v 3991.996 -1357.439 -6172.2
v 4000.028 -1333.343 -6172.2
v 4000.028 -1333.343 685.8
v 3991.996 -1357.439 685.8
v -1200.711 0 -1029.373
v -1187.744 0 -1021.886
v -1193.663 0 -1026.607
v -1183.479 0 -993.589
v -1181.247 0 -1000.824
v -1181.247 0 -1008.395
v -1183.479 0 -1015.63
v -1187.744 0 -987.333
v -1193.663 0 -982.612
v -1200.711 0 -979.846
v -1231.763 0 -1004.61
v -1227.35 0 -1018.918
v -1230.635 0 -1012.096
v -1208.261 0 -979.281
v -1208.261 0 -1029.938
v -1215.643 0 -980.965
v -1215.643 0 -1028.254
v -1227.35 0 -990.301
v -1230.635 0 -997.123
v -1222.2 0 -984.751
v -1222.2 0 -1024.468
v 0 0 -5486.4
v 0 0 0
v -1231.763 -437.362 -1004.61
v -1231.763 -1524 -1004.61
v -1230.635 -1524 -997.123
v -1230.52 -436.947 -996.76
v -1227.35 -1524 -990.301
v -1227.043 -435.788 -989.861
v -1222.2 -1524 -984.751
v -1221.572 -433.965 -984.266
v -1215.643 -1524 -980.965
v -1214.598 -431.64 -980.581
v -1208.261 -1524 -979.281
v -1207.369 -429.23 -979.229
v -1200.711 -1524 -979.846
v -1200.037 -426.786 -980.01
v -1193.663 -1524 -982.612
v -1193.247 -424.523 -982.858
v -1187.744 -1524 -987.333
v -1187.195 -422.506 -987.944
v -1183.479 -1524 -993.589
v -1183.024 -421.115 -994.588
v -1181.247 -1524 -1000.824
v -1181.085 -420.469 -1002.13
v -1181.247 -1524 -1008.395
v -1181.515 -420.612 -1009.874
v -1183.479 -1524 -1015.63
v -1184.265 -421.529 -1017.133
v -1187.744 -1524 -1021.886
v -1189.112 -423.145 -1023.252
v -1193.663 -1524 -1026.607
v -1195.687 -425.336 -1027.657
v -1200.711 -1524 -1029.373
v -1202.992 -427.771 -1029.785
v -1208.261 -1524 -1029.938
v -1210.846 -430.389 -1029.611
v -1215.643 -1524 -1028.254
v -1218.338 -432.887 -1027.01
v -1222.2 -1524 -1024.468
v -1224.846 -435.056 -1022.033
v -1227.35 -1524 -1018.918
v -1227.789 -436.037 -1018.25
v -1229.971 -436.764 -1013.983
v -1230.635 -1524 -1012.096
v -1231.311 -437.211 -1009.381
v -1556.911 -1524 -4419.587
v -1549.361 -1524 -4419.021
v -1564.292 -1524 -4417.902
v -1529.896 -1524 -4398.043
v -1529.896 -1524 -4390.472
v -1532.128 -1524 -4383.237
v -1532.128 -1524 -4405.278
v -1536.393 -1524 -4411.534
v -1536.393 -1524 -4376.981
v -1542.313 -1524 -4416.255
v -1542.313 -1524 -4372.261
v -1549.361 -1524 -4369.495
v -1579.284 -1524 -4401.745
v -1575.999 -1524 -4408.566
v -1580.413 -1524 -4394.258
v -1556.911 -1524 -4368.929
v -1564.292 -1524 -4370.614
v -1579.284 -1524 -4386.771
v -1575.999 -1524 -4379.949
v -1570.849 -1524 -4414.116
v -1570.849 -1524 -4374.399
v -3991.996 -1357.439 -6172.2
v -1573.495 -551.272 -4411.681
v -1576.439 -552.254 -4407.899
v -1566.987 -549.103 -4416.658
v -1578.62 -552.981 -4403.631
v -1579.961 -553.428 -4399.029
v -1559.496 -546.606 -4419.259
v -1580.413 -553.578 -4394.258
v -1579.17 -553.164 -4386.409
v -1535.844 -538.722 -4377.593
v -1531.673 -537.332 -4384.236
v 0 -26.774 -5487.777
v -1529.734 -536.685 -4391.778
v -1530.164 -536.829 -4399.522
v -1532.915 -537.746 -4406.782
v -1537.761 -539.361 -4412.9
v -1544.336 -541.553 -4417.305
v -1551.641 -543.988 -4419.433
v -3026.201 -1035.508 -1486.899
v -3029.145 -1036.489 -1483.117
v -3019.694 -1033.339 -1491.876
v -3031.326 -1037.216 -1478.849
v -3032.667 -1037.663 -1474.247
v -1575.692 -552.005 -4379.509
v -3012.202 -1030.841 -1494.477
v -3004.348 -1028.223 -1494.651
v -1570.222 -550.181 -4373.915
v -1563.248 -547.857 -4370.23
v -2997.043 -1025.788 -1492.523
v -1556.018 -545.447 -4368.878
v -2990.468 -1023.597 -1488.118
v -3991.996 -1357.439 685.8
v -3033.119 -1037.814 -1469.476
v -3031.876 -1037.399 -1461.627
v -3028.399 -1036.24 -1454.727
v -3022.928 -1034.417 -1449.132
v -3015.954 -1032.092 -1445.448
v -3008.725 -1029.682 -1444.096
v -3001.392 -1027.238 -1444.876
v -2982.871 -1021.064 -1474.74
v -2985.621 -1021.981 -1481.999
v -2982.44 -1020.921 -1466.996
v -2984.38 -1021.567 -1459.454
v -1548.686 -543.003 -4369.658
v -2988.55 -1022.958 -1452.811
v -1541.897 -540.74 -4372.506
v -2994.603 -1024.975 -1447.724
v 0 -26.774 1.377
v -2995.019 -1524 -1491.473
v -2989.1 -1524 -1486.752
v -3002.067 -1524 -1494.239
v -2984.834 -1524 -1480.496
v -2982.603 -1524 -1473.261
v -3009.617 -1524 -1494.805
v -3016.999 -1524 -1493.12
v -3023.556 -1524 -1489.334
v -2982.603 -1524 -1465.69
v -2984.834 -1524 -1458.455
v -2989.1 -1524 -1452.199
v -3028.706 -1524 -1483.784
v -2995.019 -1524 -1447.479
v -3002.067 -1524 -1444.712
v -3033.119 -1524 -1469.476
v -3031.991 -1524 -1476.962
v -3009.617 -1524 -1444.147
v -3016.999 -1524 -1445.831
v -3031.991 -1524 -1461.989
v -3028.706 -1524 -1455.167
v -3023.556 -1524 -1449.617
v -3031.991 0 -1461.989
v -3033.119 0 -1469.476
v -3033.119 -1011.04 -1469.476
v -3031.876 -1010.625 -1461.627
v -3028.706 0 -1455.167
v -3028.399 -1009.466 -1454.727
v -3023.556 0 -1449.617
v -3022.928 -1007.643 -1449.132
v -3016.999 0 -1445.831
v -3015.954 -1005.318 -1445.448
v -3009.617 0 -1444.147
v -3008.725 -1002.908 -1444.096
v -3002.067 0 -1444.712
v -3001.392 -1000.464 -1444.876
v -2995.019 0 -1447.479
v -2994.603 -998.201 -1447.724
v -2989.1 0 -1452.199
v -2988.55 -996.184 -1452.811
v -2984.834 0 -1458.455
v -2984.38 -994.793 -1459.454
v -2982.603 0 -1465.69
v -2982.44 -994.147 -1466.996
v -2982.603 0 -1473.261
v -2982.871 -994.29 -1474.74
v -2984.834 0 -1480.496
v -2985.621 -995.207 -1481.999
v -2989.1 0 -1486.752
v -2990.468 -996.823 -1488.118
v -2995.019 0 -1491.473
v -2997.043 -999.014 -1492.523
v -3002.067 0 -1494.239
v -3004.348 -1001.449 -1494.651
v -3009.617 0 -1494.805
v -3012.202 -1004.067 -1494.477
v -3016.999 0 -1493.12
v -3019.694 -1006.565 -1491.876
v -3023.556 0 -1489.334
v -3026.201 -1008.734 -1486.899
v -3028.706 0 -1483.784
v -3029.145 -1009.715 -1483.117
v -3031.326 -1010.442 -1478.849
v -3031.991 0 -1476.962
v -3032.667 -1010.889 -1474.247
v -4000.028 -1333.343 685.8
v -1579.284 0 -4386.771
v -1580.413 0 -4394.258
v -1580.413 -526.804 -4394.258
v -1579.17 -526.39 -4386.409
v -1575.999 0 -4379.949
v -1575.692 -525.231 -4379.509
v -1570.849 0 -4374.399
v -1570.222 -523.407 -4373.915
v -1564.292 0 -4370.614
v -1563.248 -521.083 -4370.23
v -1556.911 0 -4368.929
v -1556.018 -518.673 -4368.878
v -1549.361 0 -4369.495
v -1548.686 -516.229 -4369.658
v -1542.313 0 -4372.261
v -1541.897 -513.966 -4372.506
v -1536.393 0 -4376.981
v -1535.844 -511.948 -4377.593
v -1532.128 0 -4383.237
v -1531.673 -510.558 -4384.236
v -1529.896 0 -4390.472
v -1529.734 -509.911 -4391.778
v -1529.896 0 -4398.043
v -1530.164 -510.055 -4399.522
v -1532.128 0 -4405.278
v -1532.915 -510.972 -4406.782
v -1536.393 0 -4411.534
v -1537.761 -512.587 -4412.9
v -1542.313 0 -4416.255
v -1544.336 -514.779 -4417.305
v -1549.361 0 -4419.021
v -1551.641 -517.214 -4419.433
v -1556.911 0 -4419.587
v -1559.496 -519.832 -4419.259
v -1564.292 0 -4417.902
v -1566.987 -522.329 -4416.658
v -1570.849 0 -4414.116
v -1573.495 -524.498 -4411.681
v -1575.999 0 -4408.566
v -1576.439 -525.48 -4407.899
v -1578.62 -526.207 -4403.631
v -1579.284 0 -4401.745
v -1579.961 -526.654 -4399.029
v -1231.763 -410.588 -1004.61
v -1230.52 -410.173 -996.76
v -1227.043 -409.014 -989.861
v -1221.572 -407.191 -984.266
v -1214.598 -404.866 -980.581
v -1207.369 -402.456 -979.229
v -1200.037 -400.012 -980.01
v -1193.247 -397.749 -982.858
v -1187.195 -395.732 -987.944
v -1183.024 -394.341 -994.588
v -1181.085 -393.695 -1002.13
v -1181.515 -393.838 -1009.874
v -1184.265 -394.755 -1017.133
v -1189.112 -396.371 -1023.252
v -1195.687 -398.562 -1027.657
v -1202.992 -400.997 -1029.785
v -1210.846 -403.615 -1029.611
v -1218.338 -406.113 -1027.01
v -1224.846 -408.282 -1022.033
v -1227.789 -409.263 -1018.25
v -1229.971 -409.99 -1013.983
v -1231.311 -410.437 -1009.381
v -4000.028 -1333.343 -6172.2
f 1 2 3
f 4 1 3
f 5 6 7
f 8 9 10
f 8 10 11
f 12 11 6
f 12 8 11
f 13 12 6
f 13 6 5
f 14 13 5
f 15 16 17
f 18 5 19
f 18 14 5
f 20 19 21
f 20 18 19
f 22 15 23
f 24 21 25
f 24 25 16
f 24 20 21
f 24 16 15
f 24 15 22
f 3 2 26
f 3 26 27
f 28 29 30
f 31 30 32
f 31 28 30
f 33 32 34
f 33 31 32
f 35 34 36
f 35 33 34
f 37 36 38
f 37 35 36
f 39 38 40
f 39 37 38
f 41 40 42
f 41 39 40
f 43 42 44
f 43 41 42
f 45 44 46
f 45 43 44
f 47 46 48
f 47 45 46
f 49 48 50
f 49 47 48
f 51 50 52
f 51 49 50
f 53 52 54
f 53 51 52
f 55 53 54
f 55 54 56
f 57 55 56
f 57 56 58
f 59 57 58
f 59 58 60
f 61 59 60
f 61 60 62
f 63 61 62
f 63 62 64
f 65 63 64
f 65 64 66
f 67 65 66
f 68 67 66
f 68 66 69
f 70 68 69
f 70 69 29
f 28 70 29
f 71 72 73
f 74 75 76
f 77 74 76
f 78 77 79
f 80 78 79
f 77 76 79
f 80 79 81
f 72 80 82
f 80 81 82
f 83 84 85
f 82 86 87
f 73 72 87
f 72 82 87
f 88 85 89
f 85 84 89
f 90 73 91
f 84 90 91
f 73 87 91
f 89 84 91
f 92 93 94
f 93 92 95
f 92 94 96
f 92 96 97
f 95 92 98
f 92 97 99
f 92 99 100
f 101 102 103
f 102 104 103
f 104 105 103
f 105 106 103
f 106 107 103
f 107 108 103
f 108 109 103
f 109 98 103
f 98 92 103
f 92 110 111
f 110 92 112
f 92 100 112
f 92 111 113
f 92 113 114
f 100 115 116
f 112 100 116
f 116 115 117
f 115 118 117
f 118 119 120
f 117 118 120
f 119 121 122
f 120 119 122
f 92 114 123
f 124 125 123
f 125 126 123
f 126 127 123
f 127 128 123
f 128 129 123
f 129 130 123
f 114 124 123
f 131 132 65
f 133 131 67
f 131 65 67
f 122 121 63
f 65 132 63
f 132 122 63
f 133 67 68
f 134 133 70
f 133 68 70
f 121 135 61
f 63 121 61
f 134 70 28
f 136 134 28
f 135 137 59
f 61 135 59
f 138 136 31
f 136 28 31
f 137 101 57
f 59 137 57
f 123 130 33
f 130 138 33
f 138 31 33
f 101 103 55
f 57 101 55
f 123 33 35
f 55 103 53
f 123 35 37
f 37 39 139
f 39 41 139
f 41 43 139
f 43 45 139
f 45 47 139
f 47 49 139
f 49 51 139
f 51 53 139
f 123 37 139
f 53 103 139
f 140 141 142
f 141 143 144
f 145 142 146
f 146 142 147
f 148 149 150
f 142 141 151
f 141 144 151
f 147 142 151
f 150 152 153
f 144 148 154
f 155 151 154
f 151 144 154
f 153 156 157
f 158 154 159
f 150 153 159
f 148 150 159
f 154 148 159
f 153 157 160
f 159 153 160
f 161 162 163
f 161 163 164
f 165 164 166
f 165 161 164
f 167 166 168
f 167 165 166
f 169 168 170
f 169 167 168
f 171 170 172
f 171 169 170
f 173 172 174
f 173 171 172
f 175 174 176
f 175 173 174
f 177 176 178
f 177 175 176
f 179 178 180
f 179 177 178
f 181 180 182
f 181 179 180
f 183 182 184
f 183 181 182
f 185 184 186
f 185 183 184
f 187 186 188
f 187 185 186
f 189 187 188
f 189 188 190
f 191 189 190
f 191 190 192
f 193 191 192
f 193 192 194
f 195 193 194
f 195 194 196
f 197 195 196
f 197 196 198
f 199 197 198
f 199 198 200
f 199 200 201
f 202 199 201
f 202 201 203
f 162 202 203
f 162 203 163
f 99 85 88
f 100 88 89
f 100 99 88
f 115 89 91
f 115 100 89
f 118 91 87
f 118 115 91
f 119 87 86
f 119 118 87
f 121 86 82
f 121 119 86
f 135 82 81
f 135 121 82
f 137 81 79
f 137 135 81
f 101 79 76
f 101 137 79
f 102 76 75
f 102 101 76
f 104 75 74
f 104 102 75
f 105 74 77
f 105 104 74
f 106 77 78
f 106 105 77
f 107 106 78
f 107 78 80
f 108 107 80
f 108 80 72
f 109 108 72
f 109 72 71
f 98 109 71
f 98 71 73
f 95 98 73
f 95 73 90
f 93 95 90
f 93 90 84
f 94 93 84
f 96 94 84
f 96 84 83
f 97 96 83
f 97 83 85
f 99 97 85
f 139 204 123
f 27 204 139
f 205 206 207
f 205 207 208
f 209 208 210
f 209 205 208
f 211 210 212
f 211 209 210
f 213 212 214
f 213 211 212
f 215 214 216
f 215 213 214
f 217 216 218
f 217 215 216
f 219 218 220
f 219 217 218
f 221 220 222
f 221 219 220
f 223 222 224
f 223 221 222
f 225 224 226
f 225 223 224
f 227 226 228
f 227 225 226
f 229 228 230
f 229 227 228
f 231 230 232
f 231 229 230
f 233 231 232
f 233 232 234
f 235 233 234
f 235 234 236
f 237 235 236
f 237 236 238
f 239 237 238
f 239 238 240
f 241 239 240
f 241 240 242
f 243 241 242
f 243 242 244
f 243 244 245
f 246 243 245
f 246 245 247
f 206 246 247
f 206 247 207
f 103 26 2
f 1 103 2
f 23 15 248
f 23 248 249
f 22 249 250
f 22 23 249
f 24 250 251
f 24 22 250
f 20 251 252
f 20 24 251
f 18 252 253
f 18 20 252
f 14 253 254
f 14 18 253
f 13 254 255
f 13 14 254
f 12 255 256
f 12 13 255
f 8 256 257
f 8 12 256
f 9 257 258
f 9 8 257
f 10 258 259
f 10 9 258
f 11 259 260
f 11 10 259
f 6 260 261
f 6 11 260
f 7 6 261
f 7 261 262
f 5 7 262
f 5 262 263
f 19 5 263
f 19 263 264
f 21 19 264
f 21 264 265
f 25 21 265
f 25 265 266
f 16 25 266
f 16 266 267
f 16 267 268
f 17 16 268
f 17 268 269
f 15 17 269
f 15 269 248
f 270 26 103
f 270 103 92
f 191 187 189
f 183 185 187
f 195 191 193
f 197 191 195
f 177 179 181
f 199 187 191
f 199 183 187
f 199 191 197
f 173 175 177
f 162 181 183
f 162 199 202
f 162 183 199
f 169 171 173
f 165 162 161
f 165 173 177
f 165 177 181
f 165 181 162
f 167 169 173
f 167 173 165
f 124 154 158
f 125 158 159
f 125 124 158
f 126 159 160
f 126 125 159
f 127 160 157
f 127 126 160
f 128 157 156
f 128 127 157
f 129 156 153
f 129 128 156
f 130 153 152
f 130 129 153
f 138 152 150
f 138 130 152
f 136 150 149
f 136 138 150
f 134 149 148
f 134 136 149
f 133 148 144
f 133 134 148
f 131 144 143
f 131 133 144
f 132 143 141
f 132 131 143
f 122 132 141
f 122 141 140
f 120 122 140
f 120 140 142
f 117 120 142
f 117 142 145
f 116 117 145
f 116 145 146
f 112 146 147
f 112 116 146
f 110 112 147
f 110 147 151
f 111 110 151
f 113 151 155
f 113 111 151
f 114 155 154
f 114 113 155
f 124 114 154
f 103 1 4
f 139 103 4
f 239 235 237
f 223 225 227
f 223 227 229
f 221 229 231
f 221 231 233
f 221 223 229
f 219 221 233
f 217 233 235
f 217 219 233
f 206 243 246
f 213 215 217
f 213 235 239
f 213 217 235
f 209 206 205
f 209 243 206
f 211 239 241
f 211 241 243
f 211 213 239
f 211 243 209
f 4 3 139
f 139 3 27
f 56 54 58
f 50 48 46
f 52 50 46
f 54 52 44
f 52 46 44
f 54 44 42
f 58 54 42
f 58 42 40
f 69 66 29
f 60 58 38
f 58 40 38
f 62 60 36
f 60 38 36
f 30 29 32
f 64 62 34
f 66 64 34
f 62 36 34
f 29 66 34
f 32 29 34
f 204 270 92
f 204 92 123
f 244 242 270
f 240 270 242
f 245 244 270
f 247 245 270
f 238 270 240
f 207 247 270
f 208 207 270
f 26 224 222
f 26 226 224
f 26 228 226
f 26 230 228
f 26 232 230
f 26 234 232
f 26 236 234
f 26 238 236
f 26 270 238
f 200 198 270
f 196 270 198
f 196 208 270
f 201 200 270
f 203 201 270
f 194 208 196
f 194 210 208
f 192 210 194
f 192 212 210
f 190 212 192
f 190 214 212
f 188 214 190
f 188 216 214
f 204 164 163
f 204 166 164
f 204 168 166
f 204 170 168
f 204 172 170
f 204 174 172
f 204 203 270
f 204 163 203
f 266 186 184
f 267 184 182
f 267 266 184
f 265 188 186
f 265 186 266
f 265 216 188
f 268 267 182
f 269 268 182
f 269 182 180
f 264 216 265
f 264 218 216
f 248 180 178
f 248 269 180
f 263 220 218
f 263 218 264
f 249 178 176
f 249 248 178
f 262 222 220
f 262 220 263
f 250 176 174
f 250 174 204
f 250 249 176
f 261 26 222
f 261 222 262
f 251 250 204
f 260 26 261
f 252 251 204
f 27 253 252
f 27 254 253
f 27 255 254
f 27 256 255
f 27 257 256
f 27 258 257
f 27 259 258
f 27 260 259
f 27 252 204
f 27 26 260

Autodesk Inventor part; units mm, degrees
ref_plane "YZ Plane" through (0, 0, 0) normal (1, 0, 0) x (0, 1, 0)
ref_plane "Work Plane3" through (0, 0, 0) normal (-0.3162278, 0.9486833, 0) x (0, 0, 1)
sketch "Sketch5" plane through (0, 0, 0) normal (-0.3162278, 0.9486833, 0) x (0, 0, 1)
  line L0 (0, 0) -> (-5486.4, 0)
  line L1 (-5486.4, 0) -> (-6172.2, -4216.4)
  line L2 (-6172.2, -4216.4) -> (685.8, -4216.4)
  line L3 (685.8, -4216.4) -> (0, 0)
  line L4 (-7543.8, 0) -> (2057.4, 0) projected
  dimension "d14" = 5486.4
  dimension "d15" = 4216.4
  dimension "d18" = 6858
ref_plane "Work Plane4" through (0, 0, 0) normal (0.3162278, 0.9486833, 0) x (0, 0, 1)
sketch "Sketch6" plane through (0, 0, 0) normal (0.3162278, 0.9486833, 0) x (0, 0, 1)
  line L0 (0, 0) -> (-5486.4, 0)
  line L1 (-5486.4, 0) -> (-6172.2, 4216.4)
  line L2 (-6172.2, 4216.4) -> (685.8, 4216.4)
  line L3 (685.8, 4216.4) -> (0, 0)
  dimension "d20" = 5486.4
  dimension "d21" = 6858
  dimension "d22" = 4216.4
extrude "Extrusion3" add sketch "Sketch5" against normal blind 25.4
extrude "Extrusion4" add sketch "Sketch6" against normal blind 25.4
sketch "Sketch7" plane through (0, 0, 0) normal (0, 1, 0) x (-1, 0, 0)
  circle A0 centre (1555.0127, -4394.2578) radius 25.4
  circle A1 centre (1206.3632, -1004.6095) radius 25.4
  circle A2 centre (3007.7191, -1469.4756) radius 25.4
  point P0 (0, 0)
  dimension "d27" = 50.8
extrude "Extrusion5" add sketch "Sketch7" against normal blind 1524
equation "\"d14\" = dormerRidgeLineLength"
equation "\"d15\" = dormerRidgeToGarageEave"
equation "\"d18\" = dormerGarageEaveLength"
equation "\"d20\" = dormerRidgeLineLength"
equation "\"d21\" = dormerPoolEaveLength"
equation "\"d22\" = dormerRidgeToPoolEave"
equation "\"pitch_6_12\" = 26.565deg"
equation "\"d11\" = pitch_4_12"
equation "\"pitch_4_12\" = 18.434949deg"
equation "\"dormerRidgeLineLength\" = 5486.4"
equation "\"dormerPoolEaveLength\" = 6858"
equation "\"dormerGarageEaveLength\" = 6858"
equation "\"dormerRidgeToGarageEave\" = 4216.4"
equation "\"d19\" = -pitch_4_12"
equation "\"dormerRidgeToPoolEave\" = 4216.4"
properties part number "houseDormerRoof"
